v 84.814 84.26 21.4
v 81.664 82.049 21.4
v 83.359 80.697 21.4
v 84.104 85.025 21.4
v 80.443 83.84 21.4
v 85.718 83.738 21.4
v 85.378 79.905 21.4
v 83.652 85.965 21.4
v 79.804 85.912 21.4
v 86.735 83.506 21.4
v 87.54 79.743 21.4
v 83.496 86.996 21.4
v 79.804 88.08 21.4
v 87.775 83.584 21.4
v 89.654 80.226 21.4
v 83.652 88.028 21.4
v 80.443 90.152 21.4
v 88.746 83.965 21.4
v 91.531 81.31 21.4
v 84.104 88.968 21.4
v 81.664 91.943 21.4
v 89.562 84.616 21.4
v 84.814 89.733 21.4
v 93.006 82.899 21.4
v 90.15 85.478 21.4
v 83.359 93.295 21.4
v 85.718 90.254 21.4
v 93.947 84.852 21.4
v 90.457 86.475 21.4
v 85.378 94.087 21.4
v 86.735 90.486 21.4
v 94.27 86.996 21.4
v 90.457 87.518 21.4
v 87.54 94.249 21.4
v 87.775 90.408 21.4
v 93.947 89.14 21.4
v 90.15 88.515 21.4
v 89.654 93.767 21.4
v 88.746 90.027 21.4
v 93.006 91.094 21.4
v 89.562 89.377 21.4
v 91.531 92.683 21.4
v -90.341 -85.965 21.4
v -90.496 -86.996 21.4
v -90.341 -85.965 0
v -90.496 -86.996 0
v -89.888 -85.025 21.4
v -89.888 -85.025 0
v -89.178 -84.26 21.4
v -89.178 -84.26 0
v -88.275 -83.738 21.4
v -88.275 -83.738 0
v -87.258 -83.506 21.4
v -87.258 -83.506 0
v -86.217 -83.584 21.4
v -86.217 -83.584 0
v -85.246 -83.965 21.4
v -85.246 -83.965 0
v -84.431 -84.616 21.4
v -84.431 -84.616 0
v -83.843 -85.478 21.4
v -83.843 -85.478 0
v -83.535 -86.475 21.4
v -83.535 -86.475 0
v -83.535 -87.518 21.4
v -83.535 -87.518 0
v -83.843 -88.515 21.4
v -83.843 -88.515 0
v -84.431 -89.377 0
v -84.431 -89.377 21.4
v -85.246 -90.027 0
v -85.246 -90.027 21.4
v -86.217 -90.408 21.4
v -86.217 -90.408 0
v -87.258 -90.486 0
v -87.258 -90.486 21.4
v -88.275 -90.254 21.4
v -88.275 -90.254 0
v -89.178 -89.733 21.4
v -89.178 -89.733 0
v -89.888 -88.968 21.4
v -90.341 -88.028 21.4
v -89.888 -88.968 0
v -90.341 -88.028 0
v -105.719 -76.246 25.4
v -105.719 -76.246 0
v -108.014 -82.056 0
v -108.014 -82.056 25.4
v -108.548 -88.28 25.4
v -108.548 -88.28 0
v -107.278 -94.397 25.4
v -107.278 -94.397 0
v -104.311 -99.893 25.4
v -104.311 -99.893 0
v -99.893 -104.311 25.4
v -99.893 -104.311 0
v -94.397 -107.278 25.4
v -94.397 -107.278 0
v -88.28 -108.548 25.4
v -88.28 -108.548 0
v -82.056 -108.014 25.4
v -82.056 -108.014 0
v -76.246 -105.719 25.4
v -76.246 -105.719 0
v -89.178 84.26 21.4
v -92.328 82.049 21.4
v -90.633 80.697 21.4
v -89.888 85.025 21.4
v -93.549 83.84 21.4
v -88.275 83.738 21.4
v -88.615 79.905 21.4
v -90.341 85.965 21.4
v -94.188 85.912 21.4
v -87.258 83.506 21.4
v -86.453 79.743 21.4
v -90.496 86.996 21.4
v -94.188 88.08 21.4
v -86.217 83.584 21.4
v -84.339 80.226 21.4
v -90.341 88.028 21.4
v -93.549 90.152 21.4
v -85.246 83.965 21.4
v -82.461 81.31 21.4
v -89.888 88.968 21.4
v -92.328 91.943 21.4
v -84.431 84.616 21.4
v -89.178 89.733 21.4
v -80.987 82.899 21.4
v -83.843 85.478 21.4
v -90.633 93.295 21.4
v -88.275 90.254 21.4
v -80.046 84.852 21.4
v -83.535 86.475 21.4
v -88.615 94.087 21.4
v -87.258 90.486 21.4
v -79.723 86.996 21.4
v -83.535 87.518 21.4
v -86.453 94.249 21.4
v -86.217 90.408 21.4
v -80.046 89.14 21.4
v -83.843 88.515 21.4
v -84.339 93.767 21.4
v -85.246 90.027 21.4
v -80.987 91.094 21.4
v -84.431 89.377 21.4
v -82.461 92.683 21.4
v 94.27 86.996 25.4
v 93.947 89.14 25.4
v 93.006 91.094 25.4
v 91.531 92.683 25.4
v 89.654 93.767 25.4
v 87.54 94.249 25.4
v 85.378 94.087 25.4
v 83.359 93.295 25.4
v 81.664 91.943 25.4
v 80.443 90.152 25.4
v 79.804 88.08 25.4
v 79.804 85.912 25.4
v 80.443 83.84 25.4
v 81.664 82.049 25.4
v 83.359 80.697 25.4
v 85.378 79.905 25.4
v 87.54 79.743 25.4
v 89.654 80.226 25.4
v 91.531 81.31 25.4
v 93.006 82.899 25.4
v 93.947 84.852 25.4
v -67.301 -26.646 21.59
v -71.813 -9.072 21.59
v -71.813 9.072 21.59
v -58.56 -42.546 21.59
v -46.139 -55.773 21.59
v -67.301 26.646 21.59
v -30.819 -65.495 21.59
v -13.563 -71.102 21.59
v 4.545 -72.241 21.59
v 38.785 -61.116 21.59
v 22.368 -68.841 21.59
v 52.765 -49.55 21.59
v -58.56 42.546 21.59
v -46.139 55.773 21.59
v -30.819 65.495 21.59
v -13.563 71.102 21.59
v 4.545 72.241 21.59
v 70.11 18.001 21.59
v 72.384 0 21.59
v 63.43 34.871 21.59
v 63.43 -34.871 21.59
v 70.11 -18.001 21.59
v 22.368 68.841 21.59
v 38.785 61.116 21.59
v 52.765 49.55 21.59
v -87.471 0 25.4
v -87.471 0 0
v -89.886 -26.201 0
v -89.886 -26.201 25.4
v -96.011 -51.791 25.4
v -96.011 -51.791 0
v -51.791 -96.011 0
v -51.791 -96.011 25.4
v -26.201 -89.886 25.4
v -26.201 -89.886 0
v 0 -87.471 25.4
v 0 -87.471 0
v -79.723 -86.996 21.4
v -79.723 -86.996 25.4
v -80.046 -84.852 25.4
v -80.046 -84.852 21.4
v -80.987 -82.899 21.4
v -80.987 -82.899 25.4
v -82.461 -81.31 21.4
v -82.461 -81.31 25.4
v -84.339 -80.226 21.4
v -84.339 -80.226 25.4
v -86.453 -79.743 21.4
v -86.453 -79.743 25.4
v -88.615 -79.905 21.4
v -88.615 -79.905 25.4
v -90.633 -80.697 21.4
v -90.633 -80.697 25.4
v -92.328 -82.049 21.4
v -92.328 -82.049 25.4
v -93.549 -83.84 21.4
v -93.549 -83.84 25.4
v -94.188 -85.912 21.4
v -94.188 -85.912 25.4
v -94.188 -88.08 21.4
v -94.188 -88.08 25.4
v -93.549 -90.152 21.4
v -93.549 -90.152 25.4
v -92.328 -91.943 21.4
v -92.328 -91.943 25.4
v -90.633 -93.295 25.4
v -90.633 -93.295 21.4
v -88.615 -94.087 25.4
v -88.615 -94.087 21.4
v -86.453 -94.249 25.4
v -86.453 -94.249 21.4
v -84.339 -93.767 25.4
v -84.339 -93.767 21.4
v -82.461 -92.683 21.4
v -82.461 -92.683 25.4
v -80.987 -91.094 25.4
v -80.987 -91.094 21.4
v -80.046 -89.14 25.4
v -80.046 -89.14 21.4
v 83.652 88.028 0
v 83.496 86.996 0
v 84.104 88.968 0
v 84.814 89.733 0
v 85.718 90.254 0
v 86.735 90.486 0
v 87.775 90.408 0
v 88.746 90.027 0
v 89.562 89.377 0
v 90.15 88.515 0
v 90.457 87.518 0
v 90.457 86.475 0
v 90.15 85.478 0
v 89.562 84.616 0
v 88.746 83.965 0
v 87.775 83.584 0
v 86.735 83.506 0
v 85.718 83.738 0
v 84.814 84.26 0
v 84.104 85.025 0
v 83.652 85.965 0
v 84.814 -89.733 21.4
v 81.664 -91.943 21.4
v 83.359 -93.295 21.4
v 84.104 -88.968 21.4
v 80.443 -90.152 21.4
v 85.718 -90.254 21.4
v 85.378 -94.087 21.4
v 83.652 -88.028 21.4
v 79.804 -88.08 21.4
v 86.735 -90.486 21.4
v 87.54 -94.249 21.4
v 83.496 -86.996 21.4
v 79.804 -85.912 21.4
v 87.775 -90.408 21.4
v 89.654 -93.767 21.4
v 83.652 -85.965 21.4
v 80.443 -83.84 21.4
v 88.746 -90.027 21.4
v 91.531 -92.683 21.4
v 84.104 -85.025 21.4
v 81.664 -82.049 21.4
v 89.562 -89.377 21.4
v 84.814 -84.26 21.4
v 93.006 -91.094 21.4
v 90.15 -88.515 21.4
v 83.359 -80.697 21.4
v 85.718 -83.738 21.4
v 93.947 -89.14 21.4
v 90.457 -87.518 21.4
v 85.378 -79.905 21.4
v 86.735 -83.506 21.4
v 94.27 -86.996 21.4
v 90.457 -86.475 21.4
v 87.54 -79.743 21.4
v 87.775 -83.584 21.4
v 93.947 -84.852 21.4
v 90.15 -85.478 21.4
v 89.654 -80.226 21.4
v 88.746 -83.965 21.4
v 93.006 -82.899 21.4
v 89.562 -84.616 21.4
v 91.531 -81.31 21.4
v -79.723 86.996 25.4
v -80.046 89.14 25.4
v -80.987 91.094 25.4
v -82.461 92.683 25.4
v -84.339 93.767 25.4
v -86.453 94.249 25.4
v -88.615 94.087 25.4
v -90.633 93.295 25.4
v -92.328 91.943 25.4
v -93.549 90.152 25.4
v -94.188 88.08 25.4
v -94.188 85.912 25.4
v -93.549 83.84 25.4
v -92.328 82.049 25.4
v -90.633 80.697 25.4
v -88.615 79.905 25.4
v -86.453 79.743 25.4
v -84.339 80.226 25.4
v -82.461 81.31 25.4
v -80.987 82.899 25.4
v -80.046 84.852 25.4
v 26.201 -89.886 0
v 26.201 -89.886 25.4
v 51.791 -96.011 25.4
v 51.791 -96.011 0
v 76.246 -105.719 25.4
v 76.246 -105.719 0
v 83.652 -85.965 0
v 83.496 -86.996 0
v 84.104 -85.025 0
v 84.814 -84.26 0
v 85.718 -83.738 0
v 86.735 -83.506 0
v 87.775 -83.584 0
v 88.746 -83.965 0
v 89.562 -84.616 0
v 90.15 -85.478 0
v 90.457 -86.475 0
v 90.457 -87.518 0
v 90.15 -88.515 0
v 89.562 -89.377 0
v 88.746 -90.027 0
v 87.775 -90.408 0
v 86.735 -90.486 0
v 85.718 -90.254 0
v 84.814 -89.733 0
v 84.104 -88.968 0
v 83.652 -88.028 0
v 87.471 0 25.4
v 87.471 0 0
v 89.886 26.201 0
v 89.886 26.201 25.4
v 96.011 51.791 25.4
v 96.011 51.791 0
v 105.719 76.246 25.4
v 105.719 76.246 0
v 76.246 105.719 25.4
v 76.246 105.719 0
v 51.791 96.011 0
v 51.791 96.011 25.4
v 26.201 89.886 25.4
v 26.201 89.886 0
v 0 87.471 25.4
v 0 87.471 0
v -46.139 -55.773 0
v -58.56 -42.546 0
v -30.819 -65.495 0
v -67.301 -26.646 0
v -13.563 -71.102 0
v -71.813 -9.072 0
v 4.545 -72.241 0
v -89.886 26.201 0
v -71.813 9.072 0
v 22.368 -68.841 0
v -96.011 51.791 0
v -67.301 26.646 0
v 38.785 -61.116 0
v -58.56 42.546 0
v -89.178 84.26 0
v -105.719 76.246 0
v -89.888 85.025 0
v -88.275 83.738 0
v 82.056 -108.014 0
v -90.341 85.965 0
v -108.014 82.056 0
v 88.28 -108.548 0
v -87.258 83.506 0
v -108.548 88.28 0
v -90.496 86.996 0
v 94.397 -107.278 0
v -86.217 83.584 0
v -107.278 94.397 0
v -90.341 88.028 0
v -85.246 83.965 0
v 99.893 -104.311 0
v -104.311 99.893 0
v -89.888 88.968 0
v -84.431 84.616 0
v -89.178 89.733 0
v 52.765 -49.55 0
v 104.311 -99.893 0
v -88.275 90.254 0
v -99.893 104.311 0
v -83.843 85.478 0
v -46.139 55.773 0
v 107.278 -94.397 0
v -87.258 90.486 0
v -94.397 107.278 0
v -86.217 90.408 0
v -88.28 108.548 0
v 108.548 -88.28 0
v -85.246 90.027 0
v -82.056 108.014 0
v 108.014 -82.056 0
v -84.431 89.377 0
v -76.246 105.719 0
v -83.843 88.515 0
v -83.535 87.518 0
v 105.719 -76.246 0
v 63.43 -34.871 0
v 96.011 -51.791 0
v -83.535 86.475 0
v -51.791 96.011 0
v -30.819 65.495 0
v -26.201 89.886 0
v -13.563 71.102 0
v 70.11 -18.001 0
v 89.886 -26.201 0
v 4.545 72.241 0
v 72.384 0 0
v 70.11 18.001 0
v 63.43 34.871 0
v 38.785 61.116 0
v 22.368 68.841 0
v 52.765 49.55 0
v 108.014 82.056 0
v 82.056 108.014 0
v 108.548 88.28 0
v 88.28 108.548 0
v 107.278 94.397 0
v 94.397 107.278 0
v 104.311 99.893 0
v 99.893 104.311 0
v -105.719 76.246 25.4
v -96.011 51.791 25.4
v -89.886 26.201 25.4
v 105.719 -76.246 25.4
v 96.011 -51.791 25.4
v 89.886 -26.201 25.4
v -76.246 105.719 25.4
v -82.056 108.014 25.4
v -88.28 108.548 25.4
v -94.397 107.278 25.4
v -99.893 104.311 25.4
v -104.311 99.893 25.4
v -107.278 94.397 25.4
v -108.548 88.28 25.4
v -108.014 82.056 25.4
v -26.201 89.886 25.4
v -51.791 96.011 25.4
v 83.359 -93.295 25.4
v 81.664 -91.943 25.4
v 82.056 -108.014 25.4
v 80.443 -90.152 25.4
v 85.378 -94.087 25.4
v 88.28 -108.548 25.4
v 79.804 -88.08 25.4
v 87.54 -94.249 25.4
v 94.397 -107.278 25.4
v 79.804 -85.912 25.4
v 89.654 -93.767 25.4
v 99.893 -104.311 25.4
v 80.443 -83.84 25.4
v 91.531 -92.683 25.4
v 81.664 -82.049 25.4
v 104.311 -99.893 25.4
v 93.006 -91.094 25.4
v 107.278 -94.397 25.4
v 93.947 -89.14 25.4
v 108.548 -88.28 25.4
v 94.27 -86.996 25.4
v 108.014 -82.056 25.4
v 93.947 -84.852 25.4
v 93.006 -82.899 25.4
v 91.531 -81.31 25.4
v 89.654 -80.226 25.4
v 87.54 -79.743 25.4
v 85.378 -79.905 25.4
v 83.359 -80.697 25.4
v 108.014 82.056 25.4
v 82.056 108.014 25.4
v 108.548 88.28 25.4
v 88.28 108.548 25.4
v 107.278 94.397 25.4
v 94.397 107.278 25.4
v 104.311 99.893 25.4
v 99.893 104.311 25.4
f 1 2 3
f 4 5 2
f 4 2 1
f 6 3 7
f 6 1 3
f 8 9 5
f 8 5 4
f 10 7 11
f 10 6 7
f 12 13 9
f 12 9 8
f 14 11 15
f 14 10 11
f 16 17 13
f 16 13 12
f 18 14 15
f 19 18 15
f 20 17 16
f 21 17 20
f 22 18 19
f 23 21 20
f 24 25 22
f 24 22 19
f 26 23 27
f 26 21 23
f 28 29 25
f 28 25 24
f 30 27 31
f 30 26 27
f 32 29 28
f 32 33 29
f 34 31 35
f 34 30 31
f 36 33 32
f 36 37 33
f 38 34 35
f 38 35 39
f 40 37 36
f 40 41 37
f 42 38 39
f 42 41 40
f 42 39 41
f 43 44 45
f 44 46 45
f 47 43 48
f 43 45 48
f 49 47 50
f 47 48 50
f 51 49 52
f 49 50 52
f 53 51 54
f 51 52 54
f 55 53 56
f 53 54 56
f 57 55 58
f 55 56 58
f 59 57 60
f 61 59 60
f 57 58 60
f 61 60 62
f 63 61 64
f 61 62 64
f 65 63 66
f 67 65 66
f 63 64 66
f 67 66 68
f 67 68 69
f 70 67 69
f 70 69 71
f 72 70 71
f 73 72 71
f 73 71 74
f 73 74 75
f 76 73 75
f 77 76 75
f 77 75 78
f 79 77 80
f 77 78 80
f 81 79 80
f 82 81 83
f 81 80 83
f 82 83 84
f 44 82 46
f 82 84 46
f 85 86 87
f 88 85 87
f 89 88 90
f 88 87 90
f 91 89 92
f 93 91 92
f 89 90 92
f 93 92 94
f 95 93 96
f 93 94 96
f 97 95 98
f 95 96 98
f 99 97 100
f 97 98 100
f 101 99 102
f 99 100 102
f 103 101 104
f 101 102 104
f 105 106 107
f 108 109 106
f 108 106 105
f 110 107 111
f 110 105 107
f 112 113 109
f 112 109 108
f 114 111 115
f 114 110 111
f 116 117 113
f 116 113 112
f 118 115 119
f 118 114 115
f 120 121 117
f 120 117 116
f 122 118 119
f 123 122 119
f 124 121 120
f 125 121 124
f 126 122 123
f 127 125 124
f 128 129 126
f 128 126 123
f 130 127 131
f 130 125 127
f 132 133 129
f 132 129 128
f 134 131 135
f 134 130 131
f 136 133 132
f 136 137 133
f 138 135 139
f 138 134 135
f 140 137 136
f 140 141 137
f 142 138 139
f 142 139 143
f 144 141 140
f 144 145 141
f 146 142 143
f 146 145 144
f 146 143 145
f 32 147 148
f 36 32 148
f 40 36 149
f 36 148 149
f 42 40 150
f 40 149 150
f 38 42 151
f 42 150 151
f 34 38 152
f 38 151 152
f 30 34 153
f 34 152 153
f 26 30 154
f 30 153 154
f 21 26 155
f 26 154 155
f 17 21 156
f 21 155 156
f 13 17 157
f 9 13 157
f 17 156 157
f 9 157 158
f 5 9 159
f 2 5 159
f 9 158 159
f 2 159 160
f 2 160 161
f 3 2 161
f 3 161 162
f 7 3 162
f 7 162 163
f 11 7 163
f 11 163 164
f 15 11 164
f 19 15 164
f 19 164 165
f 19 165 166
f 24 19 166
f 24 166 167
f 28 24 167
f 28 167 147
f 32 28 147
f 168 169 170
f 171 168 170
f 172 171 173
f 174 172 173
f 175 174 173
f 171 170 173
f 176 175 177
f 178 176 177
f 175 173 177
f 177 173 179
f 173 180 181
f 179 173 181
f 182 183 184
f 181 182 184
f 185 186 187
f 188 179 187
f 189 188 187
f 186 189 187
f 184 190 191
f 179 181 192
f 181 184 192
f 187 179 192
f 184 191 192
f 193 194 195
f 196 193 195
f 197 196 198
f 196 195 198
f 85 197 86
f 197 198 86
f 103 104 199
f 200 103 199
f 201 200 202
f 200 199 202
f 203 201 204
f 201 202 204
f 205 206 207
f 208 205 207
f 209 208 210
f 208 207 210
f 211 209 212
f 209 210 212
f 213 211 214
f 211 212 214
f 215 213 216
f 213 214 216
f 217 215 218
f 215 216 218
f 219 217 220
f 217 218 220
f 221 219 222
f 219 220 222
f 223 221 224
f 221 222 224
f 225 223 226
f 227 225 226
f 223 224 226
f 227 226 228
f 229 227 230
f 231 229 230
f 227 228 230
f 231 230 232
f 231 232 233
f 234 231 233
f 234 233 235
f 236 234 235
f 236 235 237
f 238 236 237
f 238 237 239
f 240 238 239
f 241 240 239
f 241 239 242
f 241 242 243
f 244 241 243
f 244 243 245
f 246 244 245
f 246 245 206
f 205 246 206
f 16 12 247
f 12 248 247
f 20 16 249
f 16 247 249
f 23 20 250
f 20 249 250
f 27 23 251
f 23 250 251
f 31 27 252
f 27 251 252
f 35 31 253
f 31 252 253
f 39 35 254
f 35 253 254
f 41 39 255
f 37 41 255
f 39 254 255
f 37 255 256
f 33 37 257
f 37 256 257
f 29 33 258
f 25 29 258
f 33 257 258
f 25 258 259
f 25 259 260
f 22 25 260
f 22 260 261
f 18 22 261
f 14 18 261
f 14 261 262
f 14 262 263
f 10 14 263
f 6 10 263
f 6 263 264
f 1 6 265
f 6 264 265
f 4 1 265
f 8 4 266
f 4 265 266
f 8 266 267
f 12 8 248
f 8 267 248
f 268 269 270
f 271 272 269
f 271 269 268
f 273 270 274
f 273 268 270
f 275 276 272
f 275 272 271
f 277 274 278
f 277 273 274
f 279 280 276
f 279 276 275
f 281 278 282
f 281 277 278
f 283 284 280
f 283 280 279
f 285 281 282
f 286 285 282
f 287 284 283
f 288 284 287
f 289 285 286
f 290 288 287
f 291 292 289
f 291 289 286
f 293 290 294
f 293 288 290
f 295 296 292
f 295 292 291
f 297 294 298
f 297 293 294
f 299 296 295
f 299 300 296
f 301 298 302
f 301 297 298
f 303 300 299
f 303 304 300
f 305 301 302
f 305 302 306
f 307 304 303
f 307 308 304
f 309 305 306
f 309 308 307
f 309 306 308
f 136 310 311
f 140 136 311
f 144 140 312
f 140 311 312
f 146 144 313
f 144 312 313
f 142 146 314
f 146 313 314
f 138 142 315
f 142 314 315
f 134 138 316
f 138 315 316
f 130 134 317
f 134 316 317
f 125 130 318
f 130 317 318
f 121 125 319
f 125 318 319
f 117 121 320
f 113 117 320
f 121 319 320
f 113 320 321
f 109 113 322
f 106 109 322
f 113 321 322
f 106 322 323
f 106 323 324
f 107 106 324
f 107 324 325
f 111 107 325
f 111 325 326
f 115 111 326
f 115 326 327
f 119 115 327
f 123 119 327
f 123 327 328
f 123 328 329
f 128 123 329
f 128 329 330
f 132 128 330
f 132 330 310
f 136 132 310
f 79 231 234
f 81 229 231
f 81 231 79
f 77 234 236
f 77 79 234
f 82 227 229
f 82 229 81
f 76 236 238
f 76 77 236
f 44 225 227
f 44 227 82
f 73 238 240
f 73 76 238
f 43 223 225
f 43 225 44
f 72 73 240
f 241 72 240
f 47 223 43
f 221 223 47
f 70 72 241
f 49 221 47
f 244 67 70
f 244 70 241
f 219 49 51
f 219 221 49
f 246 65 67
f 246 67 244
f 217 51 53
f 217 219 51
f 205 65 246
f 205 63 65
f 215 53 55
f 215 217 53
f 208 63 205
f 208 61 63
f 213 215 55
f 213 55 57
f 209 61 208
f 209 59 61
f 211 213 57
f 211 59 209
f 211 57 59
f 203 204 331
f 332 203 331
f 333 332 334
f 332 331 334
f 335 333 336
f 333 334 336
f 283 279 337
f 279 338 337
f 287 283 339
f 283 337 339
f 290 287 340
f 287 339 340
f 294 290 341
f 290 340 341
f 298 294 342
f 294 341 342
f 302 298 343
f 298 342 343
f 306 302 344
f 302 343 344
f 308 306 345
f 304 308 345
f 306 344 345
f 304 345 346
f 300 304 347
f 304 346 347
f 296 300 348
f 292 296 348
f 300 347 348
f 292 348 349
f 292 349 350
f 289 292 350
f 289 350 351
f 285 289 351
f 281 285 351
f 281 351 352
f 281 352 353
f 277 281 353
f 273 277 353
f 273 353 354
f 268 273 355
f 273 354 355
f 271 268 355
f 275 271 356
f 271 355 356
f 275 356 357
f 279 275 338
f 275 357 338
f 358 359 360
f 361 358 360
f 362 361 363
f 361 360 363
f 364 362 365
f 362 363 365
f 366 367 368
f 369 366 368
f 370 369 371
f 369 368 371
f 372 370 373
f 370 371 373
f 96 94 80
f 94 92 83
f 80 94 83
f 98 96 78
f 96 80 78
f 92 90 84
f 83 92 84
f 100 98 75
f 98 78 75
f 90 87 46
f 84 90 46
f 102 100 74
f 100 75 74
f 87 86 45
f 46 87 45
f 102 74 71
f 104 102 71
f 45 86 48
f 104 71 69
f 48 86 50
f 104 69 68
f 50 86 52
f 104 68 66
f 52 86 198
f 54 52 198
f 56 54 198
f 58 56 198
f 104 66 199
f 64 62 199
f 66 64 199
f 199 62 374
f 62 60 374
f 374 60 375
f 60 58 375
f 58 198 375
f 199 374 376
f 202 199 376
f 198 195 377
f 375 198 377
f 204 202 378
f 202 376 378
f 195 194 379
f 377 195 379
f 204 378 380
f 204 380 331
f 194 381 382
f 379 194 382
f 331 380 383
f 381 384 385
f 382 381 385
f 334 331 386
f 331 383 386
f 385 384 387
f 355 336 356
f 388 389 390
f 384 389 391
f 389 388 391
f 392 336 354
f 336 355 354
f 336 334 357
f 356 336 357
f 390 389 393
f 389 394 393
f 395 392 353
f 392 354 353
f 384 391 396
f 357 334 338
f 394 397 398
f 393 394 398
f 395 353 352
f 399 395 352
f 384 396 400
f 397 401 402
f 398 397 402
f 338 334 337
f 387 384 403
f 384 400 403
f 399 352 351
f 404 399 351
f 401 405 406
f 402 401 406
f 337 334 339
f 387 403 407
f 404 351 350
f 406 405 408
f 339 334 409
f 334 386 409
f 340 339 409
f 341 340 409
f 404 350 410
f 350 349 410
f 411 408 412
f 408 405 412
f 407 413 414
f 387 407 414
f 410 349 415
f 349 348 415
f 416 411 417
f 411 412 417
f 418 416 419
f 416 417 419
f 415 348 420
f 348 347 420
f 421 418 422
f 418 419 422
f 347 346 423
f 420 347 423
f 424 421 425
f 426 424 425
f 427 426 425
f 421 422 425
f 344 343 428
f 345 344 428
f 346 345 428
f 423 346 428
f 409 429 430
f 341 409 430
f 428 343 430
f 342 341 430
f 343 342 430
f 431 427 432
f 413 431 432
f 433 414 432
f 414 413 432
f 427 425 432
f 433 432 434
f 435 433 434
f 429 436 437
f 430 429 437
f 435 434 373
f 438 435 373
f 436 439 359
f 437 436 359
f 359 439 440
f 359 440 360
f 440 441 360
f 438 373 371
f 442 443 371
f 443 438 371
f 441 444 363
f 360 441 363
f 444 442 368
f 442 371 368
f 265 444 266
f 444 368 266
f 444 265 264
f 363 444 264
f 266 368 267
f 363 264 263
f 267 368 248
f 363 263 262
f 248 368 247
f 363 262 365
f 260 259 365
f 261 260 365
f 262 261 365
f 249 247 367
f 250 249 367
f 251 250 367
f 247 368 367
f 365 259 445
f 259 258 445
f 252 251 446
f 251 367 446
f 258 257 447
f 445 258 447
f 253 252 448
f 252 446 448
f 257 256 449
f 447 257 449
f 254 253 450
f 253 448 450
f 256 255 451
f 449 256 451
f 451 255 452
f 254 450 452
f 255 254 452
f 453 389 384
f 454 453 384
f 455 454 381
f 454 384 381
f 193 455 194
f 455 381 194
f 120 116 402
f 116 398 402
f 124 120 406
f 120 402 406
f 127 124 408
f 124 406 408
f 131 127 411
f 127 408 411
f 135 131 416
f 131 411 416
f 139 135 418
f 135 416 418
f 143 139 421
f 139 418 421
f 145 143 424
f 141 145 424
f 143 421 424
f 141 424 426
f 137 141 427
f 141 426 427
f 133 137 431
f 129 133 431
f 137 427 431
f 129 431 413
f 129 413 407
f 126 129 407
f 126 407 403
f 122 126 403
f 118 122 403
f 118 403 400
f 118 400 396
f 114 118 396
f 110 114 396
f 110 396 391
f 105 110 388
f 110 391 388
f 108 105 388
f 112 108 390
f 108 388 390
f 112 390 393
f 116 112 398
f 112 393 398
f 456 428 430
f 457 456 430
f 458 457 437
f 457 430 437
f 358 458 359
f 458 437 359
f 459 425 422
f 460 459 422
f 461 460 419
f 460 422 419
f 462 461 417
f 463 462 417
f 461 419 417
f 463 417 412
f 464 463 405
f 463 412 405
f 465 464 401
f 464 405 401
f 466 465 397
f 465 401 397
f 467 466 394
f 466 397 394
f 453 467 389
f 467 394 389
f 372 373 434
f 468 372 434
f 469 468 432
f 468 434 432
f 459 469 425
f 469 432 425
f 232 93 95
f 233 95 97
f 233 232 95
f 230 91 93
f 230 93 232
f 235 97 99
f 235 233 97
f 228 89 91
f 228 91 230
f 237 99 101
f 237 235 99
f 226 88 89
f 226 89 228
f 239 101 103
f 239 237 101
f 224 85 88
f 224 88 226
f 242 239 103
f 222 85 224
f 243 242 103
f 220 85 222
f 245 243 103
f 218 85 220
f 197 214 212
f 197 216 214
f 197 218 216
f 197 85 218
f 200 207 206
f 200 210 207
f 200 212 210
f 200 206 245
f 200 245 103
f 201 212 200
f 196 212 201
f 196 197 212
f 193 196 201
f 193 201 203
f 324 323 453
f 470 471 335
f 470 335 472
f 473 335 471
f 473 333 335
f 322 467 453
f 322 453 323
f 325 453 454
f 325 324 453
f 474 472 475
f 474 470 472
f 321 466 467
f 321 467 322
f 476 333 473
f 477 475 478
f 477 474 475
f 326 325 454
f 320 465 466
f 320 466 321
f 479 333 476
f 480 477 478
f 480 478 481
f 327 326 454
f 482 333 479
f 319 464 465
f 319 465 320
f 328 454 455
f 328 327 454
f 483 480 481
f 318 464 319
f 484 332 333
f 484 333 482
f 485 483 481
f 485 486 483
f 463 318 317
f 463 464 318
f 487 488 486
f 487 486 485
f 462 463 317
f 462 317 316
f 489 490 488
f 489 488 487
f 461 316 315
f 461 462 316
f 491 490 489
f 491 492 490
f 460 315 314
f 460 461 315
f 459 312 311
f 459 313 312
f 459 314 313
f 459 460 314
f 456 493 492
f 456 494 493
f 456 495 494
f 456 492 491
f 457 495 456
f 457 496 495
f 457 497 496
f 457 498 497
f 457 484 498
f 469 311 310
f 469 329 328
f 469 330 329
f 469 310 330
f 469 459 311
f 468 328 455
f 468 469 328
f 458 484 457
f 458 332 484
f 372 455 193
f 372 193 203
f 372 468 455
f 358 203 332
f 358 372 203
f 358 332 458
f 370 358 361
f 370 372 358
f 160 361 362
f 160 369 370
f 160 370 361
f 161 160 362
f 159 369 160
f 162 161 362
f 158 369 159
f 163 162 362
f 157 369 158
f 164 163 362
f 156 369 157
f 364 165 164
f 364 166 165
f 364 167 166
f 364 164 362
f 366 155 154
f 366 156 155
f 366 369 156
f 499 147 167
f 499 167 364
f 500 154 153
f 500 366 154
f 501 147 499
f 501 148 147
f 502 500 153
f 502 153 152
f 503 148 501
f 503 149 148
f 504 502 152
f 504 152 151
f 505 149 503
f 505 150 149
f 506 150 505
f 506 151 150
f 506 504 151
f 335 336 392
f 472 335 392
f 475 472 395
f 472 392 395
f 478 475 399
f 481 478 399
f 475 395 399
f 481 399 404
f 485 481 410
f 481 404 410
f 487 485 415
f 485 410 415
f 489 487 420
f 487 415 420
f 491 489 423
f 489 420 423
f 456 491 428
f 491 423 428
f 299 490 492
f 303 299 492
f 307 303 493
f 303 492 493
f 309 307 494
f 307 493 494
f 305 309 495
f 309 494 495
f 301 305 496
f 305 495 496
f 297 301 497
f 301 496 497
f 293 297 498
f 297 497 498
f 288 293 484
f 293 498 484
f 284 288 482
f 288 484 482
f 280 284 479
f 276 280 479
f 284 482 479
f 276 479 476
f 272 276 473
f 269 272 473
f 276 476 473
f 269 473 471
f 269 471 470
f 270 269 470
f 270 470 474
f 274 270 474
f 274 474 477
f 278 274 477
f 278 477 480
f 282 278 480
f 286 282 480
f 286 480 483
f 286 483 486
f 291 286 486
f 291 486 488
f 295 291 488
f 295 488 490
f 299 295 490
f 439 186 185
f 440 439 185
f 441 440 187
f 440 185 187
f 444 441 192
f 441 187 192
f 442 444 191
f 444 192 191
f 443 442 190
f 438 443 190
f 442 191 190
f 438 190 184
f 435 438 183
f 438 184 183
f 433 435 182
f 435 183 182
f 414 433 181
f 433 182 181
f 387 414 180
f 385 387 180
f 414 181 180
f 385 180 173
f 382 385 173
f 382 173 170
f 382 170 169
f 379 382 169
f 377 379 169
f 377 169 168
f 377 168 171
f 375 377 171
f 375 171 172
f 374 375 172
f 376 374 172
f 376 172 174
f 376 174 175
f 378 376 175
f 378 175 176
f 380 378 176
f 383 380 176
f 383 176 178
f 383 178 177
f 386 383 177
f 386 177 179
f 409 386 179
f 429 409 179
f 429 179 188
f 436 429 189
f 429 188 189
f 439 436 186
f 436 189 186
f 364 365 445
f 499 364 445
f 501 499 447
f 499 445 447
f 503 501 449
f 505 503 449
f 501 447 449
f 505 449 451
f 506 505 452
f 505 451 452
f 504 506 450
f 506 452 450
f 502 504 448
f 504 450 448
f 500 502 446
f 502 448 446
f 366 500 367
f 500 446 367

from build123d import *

# Parameters (mm, degrees)
SKETCH1_R                               = 87.47125
BOSS_EXTRUDE1_DEPTH                     = 25.4
BOSS_EXTRUDE2_DEPTH                     = 25.4
CUT_EXTRUDE1_REACH                      = 31.21
CUT_EXTRUDE1_START                      = -3.81
SKETCH8_R                               = 72.38365
CBORE_FOR_M6_HEX_HEAD_BOLT1_D           = 7
CBORE_FOR_M6_HEX_HEAD_BOLT1_CBORE_D     = 14.547
CBORE_FOR_M6_HEX_HEAD_BOLT1_CBORE_DEPTH = 4


with BuildPart() as part:
    # Sketch1 → Boss-Extrude1 (new body)
    with BuildSketch(Plane.XY):
        Circle(SKETCH1_R)
    extrude(amount=BOSS_EXTRUDE1_DEPTH)

    # Sketch3 → Boss-Extrude2 (add)
    with BuildSketch(Plane.XY):
        with BuildLine():
            ThreePointArc((-76.246005737, 105.719498865), (-102.262666579, 102.262666579), (-105.719498865, 76.246005737))
            ThreePointArc((-105.719498865, 76.246005737), (-92.490752346, 39.105377809), (-87.47125, 0))
            ThreePointArc((-87.47125, 0), (-92.490752346, -39.105377809), (-105.719498865, -76.246005737))
            ThreePointArc((-105.719498865, -76.246005737), (-102.262666579, -102.262666579), (-76.246005737, -105.719498865))
            ThreePointArc((-76.246005737, -105.719498865), (-39.105377809, -92.490752346), (0, -87.47125))
            ThreePointArc((0, -87.47125), (39.105377809, -92.490752346), (76.246005737, -105.719498865))
            ThreePointArc((76.246005737, -105.719498865), (102.262666579, -102.262666579), (105.719498865, -76.246005737))
            ThreePointArc((105.719498865, -76.246005737), (92.490752346, -39.105377809), (87.47125, 0))
            ThreePointArc((87.47125, 0), (92.490752346, 39.105377809), (105.719498865, 76.246005737))
            ThreePointArc((105.719498865, 76.246005737), (102.262666579, 102.262666579), (76.246005737, 105.719498865))
            ThreePointArc((76.246005737, 105.719498865), (39.105377809, 92.490752346), (0, 87.47125))
            ThreePointArc((0, 87.47125), (-39.105377809, 92.490752346), (-76.246005737, 105.719498865))
        make_face()
    extrude(amount=BOSS_EXTRUDE2_DEPTH)

    # Sketch8 → Cut-Extrude1 (cut, up to next)
    with BuildSketch(Plane.XY.offset(25.4).offset(CUT_EXTRUDE1_START), mode=Mode.PRIVATE) as cut_extrude1_sk1:
        Circle(SKETCH8_R)
    cut_extrude1_tool1 = extrude(cut_extrude1_sk1.sketch, amount=-CUT_EXTRUDE1_REACH, mode=Mode.PRIVATE) & part.part
    add(cut_extrude1_tool1.solids().sort_by_distance((0, 0, 21.59))[0], mode=Mode.SUBTRACT)

    # CBORE for M6 Hex Head Bolt1 (through all)
    with Locations(Plane.XY.offset(25.4)):
        with Locations((-86.996231173, 86.996231173), (86.996231173, 86.996231173), (86.996231173, -86.996231173), (-86.996231173, -86.996231173)):
            CounterBoreHole(CBORE_FOR_M6_HEX_HEAD_BOLT1_D / 2, CBORE_FOR_M6_HEX_HEAD_BOLT1_CBORE_D / 2, CBORE_FOR_M6_HEX_HEAD_BOLT1_CBORE_DEPTH)


solid = part.part
